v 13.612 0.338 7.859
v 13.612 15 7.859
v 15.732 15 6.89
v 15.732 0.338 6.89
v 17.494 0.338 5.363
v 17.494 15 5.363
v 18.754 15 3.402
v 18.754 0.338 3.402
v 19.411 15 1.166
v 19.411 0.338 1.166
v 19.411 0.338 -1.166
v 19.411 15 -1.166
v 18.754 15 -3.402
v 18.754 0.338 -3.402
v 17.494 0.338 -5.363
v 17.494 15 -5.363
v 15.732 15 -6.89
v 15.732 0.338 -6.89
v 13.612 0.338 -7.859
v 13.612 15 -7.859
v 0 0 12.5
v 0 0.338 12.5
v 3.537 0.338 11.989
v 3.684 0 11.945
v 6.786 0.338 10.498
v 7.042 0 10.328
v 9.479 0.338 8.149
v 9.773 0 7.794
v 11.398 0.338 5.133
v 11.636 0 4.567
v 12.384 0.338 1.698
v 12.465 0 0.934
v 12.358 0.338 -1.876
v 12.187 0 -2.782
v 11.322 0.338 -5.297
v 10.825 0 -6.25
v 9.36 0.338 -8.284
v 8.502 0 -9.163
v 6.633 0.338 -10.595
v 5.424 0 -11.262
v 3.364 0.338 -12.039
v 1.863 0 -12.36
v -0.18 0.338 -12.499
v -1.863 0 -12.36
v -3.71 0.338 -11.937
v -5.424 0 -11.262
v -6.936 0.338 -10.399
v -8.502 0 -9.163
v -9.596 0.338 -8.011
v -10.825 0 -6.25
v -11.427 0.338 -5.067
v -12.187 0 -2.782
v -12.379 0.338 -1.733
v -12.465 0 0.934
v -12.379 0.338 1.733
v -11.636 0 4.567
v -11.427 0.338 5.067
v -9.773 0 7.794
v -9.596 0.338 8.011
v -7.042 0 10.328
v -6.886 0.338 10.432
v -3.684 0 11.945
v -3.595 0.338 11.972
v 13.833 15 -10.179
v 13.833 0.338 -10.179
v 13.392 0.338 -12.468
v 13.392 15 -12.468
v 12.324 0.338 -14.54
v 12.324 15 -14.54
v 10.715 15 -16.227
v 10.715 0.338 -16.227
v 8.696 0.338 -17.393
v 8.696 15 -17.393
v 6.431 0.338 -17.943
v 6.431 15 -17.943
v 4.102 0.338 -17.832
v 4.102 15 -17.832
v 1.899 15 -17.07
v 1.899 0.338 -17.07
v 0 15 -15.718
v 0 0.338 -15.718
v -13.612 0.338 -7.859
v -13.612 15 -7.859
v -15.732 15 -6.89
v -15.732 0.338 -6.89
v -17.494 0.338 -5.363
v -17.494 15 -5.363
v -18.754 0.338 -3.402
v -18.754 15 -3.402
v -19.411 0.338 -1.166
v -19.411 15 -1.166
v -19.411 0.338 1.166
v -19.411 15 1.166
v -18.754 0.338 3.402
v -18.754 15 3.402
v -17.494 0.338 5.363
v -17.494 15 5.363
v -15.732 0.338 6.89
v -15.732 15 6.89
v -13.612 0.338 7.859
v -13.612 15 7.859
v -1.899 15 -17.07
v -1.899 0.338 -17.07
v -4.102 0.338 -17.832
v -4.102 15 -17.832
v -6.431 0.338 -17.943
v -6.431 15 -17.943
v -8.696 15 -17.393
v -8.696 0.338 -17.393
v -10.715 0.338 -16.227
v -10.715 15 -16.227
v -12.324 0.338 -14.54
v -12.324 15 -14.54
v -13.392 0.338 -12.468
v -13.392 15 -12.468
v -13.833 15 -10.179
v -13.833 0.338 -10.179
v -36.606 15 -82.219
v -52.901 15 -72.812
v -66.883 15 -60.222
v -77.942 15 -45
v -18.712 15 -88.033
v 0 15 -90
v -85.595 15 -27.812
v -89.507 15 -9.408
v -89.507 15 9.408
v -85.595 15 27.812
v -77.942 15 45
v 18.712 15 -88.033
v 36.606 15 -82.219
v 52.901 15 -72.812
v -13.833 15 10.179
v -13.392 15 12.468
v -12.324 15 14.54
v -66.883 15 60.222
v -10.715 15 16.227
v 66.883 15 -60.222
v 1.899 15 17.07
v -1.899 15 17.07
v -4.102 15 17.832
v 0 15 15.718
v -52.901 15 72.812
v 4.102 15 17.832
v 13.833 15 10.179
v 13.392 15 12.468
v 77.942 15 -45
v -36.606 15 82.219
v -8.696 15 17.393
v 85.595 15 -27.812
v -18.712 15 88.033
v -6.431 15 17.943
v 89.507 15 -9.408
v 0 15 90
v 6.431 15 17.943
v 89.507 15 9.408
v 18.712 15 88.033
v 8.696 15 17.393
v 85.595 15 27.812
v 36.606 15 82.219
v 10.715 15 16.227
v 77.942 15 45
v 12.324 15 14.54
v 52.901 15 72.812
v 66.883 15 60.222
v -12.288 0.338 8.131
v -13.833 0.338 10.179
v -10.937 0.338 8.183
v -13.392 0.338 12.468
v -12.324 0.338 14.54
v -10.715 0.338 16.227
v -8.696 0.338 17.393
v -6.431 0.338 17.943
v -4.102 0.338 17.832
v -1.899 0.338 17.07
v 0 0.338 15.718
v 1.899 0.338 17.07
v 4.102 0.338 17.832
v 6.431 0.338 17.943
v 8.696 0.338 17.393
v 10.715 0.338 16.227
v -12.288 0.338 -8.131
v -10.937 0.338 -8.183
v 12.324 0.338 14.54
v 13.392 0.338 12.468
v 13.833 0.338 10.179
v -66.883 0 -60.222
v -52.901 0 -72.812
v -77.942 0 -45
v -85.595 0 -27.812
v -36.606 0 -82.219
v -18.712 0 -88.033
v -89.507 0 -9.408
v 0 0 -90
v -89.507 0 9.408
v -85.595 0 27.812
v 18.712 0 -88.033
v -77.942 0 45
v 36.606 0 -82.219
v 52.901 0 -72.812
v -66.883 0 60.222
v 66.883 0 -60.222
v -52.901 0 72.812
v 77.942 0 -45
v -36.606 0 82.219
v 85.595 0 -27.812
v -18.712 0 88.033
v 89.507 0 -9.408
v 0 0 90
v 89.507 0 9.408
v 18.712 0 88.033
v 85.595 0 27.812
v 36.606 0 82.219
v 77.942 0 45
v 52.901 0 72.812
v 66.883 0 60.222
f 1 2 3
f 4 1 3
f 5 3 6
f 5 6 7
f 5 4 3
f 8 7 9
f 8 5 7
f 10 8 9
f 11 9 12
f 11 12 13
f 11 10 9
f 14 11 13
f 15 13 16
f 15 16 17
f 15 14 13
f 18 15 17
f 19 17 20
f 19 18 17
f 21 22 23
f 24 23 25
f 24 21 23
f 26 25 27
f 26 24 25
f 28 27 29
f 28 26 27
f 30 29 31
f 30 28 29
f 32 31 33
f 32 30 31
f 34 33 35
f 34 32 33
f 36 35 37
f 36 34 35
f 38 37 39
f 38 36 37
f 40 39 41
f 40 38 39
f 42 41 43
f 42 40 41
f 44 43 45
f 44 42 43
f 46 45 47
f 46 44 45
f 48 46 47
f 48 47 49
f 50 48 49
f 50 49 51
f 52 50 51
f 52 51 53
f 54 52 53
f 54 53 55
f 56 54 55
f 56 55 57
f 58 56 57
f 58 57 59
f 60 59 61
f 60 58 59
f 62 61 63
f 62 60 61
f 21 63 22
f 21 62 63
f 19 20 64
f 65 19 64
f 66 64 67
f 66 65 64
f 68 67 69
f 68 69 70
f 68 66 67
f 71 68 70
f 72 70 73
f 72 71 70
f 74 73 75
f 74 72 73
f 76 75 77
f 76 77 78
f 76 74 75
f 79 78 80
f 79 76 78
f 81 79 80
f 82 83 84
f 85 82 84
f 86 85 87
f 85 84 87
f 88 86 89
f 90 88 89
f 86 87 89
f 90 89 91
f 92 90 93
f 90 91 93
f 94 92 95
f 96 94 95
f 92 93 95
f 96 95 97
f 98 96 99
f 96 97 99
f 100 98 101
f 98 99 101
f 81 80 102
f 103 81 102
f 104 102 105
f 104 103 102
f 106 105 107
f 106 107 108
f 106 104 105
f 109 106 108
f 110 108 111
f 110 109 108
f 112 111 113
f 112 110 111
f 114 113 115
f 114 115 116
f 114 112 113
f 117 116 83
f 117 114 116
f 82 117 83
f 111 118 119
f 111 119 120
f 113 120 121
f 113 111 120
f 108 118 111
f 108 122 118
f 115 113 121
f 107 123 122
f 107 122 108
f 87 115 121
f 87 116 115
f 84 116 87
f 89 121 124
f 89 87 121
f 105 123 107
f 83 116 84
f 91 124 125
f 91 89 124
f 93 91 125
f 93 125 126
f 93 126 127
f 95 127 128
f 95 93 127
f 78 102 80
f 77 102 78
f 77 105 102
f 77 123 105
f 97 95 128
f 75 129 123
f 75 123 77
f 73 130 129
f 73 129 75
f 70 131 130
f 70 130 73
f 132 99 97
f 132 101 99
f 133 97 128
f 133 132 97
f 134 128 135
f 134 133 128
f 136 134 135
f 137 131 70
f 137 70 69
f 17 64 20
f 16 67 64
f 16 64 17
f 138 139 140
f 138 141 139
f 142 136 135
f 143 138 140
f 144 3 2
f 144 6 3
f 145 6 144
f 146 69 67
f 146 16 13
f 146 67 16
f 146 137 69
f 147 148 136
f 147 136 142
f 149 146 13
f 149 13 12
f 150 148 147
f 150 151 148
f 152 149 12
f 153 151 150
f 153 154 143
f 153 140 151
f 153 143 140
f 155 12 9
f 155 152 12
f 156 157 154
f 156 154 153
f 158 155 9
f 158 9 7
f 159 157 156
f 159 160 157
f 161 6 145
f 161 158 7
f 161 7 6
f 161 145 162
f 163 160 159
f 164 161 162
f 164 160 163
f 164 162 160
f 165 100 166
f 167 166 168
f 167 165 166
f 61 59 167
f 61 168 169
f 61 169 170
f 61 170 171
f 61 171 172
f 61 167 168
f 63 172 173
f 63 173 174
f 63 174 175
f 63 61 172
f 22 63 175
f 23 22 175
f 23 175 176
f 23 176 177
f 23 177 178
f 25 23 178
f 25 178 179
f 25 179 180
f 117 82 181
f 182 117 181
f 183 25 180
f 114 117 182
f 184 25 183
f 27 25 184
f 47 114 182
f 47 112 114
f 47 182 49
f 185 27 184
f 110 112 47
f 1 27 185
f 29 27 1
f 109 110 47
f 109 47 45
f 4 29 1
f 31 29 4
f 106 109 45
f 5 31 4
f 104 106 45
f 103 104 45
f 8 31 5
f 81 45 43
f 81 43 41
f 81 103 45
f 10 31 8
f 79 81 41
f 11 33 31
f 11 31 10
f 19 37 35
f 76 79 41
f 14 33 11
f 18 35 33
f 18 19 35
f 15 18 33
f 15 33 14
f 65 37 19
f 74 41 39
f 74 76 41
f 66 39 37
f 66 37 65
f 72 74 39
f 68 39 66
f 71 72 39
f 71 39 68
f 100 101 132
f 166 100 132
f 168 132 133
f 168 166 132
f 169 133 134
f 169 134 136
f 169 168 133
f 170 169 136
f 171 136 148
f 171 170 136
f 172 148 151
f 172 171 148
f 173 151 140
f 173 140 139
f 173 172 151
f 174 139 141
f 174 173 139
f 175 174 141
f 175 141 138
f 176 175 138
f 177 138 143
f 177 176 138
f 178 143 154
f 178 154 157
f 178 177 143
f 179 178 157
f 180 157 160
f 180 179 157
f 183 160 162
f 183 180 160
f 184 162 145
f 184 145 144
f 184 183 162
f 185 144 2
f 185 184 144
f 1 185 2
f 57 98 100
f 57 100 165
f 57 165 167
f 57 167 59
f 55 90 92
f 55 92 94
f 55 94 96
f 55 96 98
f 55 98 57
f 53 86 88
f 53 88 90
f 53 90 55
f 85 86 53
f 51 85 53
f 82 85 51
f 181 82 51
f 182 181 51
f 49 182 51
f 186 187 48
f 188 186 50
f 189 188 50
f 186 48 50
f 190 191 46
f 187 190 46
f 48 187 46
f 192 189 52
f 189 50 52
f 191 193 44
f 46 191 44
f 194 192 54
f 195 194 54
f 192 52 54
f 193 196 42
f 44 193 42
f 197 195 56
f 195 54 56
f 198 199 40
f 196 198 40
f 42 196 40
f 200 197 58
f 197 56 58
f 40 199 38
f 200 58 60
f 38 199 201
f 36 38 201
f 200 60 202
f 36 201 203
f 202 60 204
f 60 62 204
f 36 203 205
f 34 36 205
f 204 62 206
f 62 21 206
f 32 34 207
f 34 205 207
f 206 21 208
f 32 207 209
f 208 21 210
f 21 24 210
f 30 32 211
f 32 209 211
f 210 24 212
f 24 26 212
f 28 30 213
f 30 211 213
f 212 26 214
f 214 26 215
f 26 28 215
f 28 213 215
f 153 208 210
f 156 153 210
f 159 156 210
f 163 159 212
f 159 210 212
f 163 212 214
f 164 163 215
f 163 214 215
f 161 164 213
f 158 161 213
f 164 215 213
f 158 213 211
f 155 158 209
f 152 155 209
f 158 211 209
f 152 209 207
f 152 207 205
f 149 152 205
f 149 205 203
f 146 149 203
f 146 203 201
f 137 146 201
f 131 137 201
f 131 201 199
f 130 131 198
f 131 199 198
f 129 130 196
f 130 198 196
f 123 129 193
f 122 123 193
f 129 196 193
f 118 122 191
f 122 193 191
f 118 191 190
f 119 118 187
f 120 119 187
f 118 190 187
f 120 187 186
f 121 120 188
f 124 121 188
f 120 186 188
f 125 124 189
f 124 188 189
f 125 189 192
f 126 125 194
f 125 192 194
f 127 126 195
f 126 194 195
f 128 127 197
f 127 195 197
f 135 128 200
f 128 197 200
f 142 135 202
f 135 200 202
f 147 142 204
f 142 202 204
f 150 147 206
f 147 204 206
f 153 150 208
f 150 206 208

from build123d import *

# Parameters (mm, degrees)
SKETCH1_R           = 90
BOSS_EXTRUDE1_DEPTH = 15
SKETCH2_R           = 12.5
CUT_EXTRUDE1_DEPTH  = 129.16005618
SKETCH3_R           = 8.190815025
CUT_EXTRUDE2_DEPTH  = 14.66151422
CIRPATTERN1_COUNT   = 6


with BuildPart() as part:
    # Sketch1 → Boss-Extrude1 (new body)
    with BuildSketch(Plane(origin=(0, 0, 0), x_dir=(1, 0, 0), z_dir=(0, 1, 0))):
        Circle(SKETCH1_R)
    extrude(amount=BOSS_EXTRUDE1_DEPTH)

    # Sketch2 → Cut-Extrude1 (cut, through all)
    with BuildSketch(Plane(origin=(0, 0, 0), x_dir=(1, 0, 0), z_dir=(0, 1, 0))):
        Circle(SKETCH2_R)
    extrude(amount=CUT_EXTRUDE1_DEPTH, mode=Mode.SUBTRACT)

    # Sketch3 → Cut-Extrude2 (cut)
    with BuildSketch(Plane(origin=(0, 15, 0), x_dir=(1, 0, 0), z_dir=(0, 1, 0))):
        with Locations((-11.303338173, 0)):
            Circle(SKETCH3_R)
    cut_extrude2 = extrude(amount=-CUT_EXTRUDE2_DEPTH, mode=Mode.SUBTRACT)

    # CirPattern1: Cut-Extrude2 ×6 about axis
    cirpattern1_axis = Axis((0, 0, 0), (0, 1, 0))
    for i in range(1, CIRPATTERN1_COUNT):
        add(cut_extrude2.rotate(cirpattern1_axis, i * 360 / CIRPATTERN1_COUNT), mode=Mode.SUBTRACT)


solid = part.part
